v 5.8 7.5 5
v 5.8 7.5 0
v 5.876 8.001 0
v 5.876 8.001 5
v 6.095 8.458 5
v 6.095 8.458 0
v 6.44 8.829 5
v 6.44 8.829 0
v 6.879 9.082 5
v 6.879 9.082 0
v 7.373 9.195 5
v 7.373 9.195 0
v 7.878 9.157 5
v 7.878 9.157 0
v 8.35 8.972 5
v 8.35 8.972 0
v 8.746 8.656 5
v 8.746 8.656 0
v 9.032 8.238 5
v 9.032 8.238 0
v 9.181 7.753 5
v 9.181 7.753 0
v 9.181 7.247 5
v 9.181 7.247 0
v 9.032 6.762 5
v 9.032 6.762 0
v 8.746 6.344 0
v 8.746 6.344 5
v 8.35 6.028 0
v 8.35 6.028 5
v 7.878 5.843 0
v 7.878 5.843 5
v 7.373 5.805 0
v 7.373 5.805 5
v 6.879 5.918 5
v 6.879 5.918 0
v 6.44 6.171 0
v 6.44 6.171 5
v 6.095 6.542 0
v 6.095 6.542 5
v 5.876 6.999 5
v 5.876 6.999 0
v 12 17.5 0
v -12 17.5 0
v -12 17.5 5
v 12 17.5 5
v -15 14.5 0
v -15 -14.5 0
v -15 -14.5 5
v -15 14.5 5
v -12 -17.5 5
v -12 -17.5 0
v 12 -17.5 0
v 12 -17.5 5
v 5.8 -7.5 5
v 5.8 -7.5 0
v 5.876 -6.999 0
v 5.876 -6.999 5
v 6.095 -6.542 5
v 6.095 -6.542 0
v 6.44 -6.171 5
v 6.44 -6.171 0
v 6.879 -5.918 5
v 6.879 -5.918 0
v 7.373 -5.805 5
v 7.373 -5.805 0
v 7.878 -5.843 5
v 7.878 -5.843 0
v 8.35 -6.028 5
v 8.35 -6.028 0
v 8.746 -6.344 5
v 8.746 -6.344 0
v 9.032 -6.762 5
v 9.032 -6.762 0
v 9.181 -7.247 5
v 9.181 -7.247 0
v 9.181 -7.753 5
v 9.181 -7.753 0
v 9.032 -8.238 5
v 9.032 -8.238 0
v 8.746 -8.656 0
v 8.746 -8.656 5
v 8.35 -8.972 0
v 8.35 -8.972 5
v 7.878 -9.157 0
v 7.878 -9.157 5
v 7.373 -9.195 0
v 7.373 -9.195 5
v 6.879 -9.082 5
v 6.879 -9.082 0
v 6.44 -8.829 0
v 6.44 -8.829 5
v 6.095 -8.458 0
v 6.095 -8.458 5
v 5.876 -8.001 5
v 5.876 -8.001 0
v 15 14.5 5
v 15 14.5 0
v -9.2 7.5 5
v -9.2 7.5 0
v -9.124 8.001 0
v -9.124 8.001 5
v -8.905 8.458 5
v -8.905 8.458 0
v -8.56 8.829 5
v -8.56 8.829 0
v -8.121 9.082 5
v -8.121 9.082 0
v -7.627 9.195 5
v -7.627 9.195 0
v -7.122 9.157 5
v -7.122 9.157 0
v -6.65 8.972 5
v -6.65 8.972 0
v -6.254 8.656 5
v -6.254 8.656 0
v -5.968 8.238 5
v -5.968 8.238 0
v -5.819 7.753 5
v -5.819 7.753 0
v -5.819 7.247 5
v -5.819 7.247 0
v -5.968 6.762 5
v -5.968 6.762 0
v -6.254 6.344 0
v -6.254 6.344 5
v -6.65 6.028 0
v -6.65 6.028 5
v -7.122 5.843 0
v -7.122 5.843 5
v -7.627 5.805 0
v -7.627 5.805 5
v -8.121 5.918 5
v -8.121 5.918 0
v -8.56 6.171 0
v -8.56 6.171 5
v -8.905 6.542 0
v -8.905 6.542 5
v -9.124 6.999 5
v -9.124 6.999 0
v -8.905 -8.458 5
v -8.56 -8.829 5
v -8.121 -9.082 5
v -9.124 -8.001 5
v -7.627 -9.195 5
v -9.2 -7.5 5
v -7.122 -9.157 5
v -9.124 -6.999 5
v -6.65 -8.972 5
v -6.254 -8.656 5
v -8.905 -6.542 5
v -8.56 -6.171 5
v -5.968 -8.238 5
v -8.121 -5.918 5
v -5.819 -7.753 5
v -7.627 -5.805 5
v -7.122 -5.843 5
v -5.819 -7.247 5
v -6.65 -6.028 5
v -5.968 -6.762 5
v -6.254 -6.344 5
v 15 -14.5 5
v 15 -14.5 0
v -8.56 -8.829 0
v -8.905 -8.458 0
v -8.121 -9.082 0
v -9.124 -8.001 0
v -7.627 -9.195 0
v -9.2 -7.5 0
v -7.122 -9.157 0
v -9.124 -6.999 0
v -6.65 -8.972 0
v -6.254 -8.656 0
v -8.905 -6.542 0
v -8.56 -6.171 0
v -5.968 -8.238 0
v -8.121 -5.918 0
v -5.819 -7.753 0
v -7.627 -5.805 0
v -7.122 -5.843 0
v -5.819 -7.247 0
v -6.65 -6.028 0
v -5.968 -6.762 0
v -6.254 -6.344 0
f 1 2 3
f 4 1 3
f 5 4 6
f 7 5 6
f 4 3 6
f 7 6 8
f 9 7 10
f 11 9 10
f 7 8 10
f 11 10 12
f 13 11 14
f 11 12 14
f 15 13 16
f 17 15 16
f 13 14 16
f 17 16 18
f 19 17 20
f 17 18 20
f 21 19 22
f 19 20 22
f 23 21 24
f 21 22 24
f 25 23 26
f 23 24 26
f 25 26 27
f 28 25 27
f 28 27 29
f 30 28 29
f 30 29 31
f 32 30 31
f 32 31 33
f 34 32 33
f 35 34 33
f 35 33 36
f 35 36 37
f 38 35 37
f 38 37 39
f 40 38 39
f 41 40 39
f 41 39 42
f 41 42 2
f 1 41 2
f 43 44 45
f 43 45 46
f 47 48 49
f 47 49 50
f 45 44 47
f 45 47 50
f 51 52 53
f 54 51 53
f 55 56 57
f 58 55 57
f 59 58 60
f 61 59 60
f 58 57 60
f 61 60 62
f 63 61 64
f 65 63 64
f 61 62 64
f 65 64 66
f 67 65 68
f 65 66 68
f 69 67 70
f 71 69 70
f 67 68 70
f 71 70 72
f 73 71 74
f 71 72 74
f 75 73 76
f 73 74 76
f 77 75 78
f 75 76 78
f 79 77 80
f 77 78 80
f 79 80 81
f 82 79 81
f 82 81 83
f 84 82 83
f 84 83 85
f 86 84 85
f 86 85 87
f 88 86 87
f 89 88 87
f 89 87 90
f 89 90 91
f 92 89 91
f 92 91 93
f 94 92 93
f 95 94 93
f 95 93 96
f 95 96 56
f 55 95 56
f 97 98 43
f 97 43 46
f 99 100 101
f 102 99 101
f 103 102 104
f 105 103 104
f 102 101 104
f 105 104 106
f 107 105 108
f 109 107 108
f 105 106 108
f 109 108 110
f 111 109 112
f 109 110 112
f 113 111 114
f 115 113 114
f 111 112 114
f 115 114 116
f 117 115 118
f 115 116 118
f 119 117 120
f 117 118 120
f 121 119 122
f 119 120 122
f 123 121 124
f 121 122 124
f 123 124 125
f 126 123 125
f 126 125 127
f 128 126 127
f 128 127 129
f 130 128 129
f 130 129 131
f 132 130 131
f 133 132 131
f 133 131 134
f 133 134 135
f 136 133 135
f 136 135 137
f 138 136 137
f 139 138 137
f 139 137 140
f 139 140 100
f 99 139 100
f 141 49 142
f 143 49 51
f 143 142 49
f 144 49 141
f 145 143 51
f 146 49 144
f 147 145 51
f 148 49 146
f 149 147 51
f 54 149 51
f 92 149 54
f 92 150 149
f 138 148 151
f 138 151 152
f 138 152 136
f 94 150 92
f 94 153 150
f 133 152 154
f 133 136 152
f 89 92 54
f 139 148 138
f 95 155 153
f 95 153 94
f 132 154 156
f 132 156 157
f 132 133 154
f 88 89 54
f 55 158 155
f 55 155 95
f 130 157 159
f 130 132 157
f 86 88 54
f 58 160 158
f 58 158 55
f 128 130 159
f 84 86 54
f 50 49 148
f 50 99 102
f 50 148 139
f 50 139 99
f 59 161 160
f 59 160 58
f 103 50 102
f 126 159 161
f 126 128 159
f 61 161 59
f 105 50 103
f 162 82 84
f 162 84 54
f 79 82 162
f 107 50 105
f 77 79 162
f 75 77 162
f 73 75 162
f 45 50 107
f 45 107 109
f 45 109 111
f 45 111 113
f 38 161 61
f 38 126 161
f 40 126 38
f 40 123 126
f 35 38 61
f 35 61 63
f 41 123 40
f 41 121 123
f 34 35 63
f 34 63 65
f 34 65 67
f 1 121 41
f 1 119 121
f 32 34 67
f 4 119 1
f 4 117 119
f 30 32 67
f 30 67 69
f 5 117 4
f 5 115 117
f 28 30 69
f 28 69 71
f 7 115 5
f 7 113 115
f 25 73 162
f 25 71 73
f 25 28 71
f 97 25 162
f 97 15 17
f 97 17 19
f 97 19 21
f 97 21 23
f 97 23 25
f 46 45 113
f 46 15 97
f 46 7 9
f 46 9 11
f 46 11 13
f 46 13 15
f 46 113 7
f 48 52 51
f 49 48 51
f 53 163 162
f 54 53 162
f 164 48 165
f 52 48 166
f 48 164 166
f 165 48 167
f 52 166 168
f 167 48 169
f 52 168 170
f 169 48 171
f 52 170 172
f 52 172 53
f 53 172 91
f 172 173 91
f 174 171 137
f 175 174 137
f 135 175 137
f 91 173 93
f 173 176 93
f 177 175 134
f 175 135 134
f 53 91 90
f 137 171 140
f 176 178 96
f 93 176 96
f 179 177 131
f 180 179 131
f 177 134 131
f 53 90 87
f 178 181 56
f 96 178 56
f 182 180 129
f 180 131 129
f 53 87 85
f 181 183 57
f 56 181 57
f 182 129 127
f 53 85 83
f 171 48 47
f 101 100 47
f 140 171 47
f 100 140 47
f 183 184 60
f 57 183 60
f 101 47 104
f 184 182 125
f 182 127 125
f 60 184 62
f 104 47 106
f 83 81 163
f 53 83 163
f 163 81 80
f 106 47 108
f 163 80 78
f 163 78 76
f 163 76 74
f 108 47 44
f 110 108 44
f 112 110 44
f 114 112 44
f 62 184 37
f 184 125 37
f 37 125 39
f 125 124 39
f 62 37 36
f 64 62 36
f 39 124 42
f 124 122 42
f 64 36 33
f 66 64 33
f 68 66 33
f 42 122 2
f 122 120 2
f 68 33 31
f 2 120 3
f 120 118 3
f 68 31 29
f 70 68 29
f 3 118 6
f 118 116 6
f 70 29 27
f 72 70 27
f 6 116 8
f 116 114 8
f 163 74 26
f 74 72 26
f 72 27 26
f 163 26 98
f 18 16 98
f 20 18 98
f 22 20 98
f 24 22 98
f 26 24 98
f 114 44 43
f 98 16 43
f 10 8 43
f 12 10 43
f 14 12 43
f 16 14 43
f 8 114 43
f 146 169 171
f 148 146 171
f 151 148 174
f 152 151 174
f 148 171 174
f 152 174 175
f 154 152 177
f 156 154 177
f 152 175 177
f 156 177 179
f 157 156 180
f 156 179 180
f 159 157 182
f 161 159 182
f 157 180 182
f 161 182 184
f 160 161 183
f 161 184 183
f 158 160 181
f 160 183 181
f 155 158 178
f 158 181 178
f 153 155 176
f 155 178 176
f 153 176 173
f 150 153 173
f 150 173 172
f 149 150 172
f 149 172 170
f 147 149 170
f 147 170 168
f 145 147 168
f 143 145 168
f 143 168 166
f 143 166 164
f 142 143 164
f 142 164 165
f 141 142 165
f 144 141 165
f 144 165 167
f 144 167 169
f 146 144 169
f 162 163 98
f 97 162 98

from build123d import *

# Parameters (mm, degrees)
SKETCH1_W            = 30
SKETCH1_H            = 35
BOSS_EXTRUDE1_DEPTH  = 5
M3_CLEARANCE_HOLE1_D = 3.4
CHAMFER1_SIZE        = 3


with BuildPart() as part:
    # Sketch1 → Boss-Extrude1 (new body)
    with BuildSketch(Plane.XY):
        Rectangle(SKETCH1_W, SKETCH1_H)
    extrude(amount=BOSS_EXTRUDE1_DEPTH)

    # M3 Clearance Hole1 (through all)
    with Locations(Plane.XY.offset(5)):
        with Locations((7.5, -7.5), (-7.5, 7.5), (-7.5, -7.5), (7.5, 7.5)):
            Hole(M3_CLEARANCE_HOLE1_D / 2)

    # Chamfer1
    chamfer1_edges = [part.edges().sort_by_distance(p)[0] for p in [
        (15, -17.5, 2.5),
        (-15, -17.5, 2.5),
        (-15, 17.5, 2.5),
        (15, 17.5, 2.5),
    ]]
    chamfer(chamfer1_edges, length=CHAMFER1_SIZE)


solid = part.part
